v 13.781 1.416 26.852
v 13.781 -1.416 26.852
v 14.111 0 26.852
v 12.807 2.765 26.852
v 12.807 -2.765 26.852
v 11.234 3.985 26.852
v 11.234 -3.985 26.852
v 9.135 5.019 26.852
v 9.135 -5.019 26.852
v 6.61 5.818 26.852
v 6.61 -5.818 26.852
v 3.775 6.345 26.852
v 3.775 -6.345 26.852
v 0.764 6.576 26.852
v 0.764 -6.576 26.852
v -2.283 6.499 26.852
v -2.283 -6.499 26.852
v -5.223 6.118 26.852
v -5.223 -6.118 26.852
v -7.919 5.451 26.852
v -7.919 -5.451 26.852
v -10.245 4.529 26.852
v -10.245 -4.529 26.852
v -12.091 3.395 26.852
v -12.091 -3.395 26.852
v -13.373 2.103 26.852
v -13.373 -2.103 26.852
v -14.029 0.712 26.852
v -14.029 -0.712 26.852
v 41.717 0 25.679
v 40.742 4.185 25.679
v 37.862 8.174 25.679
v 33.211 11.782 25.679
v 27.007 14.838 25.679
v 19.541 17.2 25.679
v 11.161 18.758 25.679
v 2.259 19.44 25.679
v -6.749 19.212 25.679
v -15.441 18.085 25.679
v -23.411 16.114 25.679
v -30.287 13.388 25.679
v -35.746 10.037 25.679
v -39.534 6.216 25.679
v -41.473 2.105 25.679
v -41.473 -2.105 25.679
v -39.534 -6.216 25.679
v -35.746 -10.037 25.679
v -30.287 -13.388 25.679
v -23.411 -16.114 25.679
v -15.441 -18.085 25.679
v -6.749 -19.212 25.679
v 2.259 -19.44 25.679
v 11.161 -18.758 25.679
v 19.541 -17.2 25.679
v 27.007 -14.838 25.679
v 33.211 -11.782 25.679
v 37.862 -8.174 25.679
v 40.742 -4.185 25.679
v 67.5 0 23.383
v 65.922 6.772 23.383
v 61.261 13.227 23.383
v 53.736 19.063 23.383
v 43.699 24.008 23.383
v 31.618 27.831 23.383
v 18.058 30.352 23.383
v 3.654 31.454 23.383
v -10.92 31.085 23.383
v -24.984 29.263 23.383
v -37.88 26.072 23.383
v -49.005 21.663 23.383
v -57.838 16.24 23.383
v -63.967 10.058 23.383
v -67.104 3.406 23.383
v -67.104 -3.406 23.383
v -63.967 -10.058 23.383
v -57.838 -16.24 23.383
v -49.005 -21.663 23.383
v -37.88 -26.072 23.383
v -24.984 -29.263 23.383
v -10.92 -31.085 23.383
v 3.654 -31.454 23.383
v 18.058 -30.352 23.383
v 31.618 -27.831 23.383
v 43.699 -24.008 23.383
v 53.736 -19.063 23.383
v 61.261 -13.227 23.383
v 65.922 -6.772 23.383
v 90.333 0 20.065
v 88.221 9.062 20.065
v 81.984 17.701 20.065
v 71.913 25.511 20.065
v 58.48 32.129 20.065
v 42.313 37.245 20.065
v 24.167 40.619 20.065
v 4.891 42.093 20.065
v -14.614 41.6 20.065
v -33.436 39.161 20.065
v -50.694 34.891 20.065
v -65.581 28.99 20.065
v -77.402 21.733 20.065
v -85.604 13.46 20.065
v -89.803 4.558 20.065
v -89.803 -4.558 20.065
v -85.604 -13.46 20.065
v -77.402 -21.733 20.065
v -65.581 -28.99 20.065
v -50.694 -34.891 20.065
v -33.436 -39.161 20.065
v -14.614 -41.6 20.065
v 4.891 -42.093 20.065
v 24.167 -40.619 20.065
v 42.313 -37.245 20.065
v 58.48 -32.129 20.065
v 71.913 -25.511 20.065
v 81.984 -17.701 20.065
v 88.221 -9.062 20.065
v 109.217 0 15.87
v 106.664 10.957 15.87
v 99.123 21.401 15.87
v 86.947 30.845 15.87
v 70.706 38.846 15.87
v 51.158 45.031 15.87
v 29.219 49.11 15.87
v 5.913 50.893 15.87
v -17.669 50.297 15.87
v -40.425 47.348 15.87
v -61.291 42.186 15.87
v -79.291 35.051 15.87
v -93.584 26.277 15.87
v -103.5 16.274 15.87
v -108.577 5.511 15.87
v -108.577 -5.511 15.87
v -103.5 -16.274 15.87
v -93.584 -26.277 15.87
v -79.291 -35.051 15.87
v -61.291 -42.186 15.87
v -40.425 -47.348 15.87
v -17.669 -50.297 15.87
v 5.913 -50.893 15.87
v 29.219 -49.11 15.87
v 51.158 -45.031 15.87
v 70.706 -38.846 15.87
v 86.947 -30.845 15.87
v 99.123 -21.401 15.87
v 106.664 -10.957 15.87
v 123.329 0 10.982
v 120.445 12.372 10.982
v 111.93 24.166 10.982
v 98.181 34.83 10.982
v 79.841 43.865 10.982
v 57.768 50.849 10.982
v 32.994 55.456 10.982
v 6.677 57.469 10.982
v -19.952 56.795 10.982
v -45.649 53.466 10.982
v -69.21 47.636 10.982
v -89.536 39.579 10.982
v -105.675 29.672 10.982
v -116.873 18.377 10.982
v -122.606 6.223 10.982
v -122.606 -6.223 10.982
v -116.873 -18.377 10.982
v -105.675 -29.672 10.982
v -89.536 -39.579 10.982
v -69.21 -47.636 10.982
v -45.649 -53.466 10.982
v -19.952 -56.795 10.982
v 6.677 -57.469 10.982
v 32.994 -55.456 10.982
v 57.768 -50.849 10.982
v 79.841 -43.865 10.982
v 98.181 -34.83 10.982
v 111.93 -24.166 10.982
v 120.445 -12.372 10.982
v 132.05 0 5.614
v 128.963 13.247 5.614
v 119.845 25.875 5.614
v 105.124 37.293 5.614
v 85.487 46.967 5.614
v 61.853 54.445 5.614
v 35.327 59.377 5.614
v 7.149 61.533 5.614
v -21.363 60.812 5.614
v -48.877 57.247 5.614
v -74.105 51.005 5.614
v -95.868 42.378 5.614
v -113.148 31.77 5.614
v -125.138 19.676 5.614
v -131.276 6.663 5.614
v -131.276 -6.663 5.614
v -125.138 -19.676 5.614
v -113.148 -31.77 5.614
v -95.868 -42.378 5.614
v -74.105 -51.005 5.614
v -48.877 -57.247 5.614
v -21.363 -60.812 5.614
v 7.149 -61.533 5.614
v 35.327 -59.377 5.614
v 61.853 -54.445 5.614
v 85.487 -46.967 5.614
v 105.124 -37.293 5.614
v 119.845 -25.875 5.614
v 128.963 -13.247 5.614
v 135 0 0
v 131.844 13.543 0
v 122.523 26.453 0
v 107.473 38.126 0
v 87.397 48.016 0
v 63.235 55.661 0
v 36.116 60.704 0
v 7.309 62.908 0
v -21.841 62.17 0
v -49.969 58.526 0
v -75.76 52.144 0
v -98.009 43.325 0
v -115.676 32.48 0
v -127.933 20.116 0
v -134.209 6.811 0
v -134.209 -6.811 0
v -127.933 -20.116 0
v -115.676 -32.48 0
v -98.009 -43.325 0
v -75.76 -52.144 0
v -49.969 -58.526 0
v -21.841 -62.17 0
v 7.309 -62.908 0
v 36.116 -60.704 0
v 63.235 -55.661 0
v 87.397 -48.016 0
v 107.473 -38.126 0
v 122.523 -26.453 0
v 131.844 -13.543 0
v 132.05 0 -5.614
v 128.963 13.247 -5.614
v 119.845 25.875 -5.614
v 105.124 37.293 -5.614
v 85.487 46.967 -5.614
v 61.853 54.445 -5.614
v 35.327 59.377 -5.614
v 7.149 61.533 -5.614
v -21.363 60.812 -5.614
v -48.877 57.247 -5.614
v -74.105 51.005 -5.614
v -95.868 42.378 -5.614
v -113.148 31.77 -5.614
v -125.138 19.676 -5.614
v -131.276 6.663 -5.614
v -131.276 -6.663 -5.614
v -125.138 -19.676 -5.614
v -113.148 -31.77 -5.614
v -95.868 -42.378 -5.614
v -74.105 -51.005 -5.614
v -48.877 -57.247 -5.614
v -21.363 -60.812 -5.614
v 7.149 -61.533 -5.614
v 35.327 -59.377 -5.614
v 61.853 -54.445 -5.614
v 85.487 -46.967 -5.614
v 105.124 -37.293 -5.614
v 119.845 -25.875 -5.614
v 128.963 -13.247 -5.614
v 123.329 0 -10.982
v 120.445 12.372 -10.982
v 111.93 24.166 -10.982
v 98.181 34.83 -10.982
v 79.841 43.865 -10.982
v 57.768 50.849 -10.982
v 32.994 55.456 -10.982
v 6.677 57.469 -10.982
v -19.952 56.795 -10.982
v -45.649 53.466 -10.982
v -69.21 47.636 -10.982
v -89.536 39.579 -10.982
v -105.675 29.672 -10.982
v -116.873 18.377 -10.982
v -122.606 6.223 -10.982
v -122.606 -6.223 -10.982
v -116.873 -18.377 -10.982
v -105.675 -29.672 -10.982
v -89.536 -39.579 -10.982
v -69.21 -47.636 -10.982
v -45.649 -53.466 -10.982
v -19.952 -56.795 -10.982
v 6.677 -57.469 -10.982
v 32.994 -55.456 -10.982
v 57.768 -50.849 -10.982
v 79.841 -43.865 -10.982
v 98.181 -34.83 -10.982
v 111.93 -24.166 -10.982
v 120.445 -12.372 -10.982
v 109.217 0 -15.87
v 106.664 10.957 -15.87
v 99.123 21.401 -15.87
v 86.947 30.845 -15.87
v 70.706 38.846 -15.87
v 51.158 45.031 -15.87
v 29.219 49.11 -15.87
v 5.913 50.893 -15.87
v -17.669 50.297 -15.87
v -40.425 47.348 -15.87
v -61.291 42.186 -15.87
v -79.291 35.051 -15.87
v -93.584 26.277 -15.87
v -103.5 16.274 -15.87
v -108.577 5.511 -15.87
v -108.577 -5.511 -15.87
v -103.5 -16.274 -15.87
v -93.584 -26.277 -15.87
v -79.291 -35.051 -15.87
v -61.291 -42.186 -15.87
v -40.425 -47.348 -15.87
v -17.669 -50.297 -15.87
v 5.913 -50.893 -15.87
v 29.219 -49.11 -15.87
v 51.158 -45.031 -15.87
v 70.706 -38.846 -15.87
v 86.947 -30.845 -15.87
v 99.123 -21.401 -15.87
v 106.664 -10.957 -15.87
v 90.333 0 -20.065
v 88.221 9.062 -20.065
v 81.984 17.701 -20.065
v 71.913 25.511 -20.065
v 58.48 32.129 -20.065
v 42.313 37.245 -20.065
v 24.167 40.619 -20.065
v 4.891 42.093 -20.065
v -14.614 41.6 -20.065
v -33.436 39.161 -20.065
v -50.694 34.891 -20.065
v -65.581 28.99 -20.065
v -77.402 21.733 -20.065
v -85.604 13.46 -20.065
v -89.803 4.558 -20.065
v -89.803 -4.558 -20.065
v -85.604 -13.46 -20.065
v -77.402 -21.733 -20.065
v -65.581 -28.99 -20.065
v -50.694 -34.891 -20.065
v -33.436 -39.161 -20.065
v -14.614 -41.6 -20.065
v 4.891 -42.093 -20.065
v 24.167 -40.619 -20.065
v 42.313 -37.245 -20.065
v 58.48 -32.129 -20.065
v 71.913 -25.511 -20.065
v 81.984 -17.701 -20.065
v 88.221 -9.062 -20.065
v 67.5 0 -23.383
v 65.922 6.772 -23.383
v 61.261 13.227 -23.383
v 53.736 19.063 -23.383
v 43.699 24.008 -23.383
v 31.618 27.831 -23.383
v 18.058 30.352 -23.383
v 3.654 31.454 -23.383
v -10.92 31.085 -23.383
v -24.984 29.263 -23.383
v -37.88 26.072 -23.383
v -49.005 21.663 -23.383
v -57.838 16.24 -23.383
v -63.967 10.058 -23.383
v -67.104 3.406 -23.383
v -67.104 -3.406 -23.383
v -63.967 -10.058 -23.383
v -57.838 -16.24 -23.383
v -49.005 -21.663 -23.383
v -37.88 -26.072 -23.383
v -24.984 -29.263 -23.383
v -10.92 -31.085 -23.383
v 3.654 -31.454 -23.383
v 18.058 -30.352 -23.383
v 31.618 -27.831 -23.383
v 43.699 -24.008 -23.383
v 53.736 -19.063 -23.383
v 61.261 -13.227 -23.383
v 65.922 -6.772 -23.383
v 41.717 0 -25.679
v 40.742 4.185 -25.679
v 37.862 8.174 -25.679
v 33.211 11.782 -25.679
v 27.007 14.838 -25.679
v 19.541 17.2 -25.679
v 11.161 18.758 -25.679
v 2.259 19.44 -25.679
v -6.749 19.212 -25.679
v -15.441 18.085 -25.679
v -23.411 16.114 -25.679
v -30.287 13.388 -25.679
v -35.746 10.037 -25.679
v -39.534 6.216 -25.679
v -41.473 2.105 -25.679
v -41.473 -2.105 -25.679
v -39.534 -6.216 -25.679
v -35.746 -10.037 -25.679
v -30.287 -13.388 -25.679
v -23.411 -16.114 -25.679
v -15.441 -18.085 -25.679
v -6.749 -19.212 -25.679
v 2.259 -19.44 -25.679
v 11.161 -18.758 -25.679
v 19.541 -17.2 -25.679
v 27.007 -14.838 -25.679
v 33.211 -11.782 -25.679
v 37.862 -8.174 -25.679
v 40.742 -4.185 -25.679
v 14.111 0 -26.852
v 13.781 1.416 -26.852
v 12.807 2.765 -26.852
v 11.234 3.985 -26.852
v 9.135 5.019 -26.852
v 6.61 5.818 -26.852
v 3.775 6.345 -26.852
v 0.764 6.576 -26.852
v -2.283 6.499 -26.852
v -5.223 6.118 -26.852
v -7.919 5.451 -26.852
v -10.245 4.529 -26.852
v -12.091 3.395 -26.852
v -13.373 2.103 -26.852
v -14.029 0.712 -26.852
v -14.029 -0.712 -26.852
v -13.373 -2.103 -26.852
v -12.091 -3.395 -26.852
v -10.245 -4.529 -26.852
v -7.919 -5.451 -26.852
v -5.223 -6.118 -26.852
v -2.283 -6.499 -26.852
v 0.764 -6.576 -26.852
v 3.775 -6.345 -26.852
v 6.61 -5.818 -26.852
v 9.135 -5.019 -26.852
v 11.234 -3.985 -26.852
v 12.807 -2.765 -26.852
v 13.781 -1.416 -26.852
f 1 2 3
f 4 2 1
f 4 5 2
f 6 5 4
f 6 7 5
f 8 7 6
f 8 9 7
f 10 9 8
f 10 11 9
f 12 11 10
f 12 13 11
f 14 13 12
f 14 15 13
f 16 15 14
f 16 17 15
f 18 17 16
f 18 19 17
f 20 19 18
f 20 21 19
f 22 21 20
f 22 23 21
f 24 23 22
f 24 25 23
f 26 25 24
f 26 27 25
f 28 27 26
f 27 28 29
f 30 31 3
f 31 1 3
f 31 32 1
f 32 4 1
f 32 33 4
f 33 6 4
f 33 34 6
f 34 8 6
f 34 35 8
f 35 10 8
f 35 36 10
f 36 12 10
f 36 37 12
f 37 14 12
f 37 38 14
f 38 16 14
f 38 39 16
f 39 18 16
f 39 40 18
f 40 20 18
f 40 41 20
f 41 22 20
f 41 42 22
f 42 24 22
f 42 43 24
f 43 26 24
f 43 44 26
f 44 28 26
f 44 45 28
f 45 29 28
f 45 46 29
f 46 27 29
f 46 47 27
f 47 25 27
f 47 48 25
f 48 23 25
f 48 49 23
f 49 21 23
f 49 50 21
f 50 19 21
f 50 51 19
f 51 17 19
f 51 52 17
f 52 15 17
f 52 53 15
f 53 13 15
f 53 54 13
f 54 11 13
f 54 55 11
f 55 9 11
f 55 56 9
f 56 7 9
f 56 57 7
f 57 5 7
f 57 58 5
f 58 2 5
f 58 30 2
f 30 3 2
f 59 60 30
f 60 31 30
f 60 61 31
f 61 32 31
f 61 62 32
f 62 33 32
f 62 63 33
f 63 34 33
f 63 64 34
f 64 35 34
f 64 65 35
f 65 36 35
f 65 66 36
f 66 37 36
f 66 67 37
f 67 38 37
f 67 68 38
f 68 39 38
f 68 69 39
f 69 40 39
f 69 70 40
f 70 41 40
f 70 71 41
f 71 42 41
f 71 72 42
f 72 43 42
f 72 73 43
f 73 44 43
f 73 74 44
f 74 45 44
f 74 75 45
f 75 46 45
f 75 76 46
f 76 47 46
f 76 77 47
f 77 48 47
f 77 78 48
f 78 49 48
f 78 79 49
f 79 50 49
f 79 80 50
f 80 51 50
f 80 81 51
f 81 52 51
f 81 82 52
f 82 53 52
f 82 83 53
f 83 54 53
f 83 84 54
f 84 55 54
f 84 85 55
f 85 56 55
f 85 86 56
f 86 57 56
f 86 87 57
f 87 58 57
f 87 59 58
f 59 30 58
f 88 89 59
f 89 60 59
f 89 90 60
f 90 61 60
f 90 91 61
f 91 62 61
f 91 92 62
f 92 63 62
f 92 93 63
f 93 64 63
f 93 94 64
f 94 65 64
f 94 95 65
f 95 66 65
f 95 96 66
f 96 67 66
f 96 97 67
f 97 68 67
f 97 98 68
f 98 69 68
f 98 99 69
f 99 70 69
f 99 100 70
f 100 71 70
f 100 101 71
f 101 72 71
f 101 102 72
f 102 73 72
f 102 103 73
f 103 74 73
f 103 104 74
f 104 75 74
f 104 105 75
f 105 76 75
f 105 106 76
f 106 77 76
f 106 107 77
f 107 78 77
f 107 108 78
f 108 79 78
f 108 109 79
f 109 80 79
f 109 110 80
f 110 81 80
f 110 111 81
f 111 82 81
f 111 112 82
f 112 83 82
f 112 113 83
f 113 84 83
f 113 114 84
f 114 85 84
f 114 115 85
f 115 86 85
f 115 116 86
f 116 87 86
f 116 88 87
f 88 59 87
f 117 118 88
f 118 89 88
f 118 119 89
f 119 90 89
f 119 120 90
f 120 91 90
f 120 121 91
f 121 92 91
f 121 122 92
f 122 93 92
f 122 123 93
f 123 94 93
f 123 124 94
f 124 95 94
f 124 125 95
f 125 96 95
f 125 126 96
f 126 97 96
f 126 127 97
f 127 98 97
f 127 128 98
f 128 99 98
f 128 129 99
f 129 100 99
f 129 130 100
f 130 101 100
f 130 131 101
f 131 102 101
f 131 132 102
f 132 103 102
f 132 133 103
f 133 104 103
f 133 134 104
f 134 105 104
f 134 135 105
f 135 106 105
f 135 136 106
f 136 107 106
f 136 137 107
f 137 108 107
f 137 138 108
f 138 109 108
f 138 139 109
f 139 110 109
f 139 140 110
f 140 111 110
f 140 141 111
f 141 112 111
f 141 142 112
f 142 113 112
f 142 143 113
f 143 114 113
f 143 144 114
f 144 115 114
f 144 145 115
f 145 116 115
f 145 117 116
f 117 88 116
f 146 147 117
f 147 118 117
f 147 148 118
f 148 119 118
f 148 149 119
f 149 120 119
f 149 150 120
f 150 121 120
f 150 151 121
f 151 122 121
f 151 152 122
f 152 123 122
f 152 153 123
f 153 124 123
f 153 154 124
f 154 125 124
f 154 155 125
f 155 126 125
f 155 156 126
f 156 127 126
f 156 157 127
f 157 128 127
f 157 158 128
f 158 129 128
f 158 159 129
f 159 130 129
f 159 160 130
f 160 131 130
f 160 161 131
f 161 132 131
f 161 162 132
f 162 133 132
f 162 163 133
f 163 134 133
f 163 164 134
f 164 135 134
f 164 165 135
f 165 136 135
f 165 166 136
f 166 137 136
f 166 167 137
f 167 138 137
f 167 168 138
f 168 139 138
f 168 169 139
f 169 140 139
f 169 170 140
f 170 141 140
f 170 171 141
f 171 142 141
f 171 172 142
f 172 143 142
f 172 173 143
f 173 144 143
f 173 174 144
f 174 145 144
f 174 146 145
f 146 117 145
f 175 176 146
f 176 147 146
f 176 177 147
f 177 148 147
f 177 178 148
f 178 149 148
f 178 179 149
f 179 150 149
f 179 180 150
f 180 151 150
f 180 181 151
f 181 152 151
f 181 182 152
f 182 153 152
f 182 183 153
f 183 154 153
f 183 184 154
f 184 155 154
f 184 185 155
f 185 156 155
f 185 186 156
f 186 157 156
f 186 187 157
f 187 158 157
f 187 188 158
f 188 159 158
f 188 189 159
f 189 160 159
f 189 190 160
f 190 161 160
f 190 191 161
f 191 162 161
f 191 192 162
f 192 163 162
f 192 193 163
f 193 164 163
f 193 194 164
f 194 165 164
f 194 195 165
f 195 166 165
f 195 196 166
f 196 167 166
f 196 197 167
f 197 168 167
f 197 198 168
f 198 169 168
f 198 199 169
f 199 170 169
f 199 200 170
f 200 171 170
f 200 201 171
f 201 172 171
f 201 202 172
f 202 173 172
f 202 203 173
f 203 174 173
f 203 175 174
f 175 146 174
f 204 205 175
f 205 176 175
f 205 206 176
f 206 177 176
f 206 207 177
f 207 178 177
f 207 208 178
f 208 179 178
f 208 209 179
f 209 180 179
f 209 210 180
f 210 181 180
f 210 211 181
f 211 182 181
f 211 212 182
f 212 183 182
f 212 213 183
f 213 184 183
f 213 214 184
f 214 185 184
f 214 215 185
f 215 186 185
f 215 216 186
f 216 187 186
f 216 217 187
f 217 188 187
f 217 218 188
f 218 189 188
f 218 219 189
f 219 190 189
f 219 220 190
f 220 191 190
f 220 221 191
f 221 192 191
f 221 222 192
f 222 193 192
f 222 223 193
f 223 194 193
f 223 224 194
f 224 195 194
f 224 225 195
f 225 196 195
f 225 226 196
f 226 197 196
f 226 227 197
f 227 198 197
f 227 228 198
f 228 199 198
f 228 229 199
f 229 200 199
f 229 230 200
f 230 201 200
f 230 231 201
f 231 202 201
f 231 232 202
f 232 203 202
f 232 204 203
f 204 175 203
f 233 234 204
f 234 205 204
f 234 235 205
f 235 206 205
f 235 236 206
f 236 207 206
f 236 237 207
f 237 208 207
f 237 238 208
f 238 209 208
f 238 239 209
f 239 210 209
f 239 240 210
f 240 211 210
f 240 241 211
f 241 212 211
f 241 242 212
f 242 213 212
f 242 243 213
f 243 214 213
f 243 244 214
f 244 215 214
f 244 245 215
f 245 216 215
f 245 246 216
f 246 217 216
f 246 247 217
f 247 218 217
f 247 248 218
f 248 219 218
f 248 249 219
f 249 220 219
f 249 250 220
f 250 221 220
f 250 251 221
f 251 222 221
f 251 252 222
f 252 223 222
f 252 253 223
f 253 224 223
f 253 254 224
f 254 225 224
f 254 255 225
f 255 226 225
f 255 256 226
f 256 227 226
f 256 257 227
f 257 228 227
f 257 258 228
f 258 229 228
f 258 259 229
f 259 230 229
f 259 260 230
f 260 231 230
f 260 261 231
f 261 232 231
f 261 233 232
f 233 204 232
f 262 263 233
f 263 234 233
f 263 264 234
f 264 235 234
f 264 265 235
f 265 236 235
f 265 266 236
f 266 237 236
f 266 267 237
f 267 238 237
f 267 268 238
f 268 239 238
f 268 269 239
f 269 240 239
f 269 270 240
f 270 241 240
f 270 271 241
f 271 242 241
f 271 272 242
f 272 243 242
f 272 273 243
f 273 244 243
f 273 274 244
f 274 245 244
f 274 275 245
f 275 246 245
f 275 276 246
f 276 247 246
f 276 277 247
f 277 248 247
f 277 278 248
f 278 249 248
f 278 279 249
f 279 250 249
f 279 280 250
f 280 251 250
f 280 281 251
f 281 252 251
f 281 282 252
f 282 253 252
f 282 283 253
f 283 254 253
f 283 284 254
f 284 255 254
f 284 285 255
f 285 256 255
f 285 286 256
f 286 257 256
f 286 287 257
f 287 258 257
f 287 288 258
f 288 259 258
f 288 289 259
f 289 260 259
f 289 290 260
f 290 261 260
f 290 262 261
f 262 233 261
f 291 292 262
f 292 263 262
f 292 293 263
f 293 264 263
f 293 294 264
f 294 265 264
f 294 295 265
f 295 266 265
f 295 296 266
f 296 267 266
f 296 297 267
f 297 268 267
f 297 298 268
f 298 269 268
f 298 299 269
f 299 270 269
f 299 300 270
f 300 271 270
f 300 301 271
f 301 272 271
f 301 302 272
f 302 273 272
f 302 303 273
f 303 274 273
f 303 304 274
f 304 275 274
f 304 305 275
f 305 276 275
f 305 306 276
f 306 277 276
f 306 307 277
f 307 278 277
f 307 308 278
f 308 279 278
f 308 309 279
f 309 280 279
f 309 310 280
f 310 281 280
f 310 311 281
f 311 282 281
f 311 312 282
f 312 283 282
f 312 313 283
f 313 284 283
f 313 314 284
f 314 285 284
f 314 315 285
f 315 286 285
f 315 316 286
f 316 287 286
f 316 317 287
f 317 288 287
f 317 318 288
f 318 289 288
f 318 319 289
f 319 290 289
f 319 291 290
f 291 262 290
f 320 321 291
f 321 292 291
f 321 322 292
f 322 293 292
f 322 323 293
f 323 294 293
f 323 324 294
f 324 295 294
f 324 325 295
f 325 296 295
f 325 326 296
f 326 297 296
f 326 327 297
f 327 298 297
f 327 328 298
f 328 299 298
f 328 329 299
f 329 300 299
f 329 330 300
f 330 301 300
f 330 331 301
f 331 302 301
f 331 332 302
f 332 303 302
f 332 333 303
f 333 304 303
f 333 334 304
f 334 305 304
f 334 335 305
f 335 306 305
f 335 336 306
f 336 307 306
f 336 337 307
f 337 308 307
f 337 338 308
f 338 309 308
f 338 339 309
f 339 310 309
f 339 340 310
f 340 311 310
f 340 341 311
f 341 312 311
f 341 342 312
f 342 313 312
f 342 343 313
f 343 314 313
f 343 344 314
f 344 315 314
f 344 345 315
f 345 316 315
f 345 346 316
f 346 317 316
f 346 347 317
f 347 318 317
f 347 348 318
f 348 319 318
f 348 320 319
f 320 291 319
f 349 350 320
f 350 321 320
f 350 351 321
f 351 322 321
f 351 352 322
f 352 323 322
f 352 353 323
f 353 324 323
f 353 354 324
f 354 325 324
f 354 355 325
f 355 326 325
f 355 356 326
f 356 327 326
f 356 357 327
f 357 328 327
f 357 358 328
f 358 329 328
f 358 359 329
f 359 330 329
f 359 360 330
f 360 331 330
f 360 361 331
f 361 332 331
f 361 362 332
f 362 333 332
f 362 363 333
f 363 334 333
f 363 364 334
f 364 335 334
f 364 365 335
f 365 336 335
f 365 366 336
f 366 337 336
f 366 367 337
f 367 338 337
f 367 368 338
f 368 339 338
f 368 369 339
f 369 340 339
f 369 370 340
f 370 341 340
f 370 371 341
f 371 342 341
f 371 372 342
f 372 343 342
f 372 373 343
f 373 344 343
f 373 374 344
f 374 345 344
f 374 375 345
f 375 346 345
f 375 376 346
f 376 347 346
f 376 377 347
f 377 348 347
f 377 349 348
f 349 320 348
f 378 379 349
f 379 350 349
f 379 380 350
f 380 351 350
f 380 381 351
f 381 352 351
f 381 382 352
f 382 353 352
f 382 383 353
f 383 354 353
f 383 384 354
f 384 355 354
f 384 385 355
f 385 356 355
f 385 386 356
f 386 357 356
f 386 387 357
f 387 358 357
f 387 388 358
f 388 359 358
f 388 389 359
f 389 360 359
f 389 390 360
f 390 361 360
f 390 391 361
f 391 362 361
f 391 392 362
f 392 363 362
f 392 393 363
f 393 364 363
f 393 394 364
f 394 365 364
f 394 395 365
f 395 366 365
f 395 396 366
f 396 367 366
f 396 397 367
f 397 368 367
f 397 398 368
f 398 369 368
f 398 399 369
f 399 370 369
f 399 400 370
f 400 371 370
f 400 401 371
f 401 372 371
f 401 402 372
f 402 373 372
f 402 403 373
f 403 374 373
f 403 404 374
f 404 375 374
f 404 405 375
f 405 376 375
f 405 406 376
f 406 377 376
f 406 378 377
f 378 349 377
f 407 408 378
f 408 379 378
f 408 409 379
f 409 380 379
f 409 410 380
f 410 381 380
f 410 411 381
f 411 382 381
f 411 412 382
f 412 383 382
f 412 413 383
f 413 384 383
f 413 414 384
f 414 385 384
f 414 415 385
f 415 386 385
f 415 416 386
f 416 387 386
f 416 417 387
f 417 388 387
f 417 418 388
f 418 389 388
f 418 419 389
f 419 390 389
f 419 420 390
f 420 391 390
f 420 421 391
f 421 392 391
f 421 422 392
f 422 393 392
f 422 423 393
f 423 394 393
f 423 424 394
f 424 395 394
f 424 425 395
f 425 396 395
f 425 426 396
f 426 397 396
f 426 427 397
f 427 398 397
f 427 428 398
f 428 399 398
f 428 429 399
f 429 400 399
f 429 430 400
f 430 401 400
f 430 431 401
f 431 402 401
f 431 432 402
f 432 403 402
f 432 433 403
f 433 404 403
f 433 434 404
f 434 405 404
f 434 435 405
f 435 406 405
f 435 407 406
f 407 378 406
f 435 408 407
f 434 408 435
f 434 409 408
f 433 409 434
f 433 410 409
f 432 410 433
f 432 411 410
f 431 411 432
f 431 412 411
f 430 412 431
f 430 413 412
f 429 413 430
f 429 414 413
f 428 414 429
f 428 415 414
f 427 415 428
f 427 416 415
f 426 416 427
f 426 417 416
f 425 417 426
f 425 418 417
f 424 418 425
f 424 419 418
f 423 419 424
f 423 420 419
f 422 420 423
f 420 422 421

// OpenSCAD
// Generated by SolidPython 1.0.1 on 2020-07-29 00:46:51


scale(v = [15, 7, 3]) {
	sphere(r = 9);
}
/***********************************************
*********      SolidPython code:      **********
************************************************
 
# import packages: SolidPython
from solid import *
from solid.utils import *
from itertools import chain, combinations, permutations


class Resize:

    def __init__(self, scad_file):
        self.scad_file = scad_file
        #self.scad_file = import_scad(scad_file)
        # cone/cylinder param:
        self.r1 = 0
        self.r2 = 0
        self.h = 0
        # rectangular prism param:
        self.w = 0
        self.l = 0
        # ellipse param:
        self.r = 0

    # import OpenScad code (file name corresponds to shape)


    # classify shape + parameters
    def assign(self, param1, param2, param3):
        if self.scad_file == 'cone.scad':
            self.r1 = param1
            self.r2 = param2
            self.h = param3
        elif self.scad_file == 'cylinder.scad':
            self.r1 = param1
            self.r2 = param2
            self.h = param3
        elif self.scad_file == 'rectangularPrism.scad':
            self.h = param1
            self.l = param2
            self.w = param3
        else:
            self.r = param1
            self.h = param2

    # resize parameters
    def iterate(self):
        x = range(3, 20, 2)
        i = 1
        if self.scad_file == 'cone.scad':
            tempList = list(permutations(x, 2))
            for temp in tempList:
                param1 = temp[0]
                param2 = temp[1]
                filepath = 'produced_scad_files/' + 'cone' + str(param1) + '_' + str(param2) + '_' + '.scad'
                scad_render_to_file(cylinder(h=param1, r1=param2, r2=0), filepath)

        elif self.scad_file == 'cylinder.scad':
            tempList = list(permutations(x, 3))
            for temp in tempList:
                param1 = temp[0]
                param2 = temp[1]
                filepath = 'produced_scad_files/' + 'cylinder' + str(param1) + '_' + str(param2) + '_' + '.scad'
                scad_render_to_file(cylinder(h=param1, r1=param2, r2=param2), filepath)

        elif self.scad_file == 'rectangularPrism.scad':
            tempList = list(permutations(x, 3))
            for temp in tempList:
                param1 = temp[0]
                param2 = temp[1]
                param3 = temp[2]
                filepath = 'produced_scad_files/' + 'rectangularPrism' + str(param1) + '_' + str(param2) + '_' + str(
                    param3) + '.scad'
                scad_render_to_file(cube(size=(param1, param2, param3)), filepath)

        elif self.scad_file == 'ellipse.scad':
            tempList = list(permutations(x, 4))
            for temp in tempList:
                param1 = temp[0]
                param2 = temp[1]
                param3 = temp[2]
                param4 = temp[3]
                filepath = 'produced_scad_files/' + 'ellipse' + str(param1) + '_' + str(param2) + '_' + str(param3) + '_' + str(param4) + '.scad'
                scad_render_to_file(scale([param1, param2, param3])(sphere(r=param4)), filepath)

    def render_to_scadfile(self):
        scad_render_to_file(scad, 'example.scad') 
 
************************************************/
